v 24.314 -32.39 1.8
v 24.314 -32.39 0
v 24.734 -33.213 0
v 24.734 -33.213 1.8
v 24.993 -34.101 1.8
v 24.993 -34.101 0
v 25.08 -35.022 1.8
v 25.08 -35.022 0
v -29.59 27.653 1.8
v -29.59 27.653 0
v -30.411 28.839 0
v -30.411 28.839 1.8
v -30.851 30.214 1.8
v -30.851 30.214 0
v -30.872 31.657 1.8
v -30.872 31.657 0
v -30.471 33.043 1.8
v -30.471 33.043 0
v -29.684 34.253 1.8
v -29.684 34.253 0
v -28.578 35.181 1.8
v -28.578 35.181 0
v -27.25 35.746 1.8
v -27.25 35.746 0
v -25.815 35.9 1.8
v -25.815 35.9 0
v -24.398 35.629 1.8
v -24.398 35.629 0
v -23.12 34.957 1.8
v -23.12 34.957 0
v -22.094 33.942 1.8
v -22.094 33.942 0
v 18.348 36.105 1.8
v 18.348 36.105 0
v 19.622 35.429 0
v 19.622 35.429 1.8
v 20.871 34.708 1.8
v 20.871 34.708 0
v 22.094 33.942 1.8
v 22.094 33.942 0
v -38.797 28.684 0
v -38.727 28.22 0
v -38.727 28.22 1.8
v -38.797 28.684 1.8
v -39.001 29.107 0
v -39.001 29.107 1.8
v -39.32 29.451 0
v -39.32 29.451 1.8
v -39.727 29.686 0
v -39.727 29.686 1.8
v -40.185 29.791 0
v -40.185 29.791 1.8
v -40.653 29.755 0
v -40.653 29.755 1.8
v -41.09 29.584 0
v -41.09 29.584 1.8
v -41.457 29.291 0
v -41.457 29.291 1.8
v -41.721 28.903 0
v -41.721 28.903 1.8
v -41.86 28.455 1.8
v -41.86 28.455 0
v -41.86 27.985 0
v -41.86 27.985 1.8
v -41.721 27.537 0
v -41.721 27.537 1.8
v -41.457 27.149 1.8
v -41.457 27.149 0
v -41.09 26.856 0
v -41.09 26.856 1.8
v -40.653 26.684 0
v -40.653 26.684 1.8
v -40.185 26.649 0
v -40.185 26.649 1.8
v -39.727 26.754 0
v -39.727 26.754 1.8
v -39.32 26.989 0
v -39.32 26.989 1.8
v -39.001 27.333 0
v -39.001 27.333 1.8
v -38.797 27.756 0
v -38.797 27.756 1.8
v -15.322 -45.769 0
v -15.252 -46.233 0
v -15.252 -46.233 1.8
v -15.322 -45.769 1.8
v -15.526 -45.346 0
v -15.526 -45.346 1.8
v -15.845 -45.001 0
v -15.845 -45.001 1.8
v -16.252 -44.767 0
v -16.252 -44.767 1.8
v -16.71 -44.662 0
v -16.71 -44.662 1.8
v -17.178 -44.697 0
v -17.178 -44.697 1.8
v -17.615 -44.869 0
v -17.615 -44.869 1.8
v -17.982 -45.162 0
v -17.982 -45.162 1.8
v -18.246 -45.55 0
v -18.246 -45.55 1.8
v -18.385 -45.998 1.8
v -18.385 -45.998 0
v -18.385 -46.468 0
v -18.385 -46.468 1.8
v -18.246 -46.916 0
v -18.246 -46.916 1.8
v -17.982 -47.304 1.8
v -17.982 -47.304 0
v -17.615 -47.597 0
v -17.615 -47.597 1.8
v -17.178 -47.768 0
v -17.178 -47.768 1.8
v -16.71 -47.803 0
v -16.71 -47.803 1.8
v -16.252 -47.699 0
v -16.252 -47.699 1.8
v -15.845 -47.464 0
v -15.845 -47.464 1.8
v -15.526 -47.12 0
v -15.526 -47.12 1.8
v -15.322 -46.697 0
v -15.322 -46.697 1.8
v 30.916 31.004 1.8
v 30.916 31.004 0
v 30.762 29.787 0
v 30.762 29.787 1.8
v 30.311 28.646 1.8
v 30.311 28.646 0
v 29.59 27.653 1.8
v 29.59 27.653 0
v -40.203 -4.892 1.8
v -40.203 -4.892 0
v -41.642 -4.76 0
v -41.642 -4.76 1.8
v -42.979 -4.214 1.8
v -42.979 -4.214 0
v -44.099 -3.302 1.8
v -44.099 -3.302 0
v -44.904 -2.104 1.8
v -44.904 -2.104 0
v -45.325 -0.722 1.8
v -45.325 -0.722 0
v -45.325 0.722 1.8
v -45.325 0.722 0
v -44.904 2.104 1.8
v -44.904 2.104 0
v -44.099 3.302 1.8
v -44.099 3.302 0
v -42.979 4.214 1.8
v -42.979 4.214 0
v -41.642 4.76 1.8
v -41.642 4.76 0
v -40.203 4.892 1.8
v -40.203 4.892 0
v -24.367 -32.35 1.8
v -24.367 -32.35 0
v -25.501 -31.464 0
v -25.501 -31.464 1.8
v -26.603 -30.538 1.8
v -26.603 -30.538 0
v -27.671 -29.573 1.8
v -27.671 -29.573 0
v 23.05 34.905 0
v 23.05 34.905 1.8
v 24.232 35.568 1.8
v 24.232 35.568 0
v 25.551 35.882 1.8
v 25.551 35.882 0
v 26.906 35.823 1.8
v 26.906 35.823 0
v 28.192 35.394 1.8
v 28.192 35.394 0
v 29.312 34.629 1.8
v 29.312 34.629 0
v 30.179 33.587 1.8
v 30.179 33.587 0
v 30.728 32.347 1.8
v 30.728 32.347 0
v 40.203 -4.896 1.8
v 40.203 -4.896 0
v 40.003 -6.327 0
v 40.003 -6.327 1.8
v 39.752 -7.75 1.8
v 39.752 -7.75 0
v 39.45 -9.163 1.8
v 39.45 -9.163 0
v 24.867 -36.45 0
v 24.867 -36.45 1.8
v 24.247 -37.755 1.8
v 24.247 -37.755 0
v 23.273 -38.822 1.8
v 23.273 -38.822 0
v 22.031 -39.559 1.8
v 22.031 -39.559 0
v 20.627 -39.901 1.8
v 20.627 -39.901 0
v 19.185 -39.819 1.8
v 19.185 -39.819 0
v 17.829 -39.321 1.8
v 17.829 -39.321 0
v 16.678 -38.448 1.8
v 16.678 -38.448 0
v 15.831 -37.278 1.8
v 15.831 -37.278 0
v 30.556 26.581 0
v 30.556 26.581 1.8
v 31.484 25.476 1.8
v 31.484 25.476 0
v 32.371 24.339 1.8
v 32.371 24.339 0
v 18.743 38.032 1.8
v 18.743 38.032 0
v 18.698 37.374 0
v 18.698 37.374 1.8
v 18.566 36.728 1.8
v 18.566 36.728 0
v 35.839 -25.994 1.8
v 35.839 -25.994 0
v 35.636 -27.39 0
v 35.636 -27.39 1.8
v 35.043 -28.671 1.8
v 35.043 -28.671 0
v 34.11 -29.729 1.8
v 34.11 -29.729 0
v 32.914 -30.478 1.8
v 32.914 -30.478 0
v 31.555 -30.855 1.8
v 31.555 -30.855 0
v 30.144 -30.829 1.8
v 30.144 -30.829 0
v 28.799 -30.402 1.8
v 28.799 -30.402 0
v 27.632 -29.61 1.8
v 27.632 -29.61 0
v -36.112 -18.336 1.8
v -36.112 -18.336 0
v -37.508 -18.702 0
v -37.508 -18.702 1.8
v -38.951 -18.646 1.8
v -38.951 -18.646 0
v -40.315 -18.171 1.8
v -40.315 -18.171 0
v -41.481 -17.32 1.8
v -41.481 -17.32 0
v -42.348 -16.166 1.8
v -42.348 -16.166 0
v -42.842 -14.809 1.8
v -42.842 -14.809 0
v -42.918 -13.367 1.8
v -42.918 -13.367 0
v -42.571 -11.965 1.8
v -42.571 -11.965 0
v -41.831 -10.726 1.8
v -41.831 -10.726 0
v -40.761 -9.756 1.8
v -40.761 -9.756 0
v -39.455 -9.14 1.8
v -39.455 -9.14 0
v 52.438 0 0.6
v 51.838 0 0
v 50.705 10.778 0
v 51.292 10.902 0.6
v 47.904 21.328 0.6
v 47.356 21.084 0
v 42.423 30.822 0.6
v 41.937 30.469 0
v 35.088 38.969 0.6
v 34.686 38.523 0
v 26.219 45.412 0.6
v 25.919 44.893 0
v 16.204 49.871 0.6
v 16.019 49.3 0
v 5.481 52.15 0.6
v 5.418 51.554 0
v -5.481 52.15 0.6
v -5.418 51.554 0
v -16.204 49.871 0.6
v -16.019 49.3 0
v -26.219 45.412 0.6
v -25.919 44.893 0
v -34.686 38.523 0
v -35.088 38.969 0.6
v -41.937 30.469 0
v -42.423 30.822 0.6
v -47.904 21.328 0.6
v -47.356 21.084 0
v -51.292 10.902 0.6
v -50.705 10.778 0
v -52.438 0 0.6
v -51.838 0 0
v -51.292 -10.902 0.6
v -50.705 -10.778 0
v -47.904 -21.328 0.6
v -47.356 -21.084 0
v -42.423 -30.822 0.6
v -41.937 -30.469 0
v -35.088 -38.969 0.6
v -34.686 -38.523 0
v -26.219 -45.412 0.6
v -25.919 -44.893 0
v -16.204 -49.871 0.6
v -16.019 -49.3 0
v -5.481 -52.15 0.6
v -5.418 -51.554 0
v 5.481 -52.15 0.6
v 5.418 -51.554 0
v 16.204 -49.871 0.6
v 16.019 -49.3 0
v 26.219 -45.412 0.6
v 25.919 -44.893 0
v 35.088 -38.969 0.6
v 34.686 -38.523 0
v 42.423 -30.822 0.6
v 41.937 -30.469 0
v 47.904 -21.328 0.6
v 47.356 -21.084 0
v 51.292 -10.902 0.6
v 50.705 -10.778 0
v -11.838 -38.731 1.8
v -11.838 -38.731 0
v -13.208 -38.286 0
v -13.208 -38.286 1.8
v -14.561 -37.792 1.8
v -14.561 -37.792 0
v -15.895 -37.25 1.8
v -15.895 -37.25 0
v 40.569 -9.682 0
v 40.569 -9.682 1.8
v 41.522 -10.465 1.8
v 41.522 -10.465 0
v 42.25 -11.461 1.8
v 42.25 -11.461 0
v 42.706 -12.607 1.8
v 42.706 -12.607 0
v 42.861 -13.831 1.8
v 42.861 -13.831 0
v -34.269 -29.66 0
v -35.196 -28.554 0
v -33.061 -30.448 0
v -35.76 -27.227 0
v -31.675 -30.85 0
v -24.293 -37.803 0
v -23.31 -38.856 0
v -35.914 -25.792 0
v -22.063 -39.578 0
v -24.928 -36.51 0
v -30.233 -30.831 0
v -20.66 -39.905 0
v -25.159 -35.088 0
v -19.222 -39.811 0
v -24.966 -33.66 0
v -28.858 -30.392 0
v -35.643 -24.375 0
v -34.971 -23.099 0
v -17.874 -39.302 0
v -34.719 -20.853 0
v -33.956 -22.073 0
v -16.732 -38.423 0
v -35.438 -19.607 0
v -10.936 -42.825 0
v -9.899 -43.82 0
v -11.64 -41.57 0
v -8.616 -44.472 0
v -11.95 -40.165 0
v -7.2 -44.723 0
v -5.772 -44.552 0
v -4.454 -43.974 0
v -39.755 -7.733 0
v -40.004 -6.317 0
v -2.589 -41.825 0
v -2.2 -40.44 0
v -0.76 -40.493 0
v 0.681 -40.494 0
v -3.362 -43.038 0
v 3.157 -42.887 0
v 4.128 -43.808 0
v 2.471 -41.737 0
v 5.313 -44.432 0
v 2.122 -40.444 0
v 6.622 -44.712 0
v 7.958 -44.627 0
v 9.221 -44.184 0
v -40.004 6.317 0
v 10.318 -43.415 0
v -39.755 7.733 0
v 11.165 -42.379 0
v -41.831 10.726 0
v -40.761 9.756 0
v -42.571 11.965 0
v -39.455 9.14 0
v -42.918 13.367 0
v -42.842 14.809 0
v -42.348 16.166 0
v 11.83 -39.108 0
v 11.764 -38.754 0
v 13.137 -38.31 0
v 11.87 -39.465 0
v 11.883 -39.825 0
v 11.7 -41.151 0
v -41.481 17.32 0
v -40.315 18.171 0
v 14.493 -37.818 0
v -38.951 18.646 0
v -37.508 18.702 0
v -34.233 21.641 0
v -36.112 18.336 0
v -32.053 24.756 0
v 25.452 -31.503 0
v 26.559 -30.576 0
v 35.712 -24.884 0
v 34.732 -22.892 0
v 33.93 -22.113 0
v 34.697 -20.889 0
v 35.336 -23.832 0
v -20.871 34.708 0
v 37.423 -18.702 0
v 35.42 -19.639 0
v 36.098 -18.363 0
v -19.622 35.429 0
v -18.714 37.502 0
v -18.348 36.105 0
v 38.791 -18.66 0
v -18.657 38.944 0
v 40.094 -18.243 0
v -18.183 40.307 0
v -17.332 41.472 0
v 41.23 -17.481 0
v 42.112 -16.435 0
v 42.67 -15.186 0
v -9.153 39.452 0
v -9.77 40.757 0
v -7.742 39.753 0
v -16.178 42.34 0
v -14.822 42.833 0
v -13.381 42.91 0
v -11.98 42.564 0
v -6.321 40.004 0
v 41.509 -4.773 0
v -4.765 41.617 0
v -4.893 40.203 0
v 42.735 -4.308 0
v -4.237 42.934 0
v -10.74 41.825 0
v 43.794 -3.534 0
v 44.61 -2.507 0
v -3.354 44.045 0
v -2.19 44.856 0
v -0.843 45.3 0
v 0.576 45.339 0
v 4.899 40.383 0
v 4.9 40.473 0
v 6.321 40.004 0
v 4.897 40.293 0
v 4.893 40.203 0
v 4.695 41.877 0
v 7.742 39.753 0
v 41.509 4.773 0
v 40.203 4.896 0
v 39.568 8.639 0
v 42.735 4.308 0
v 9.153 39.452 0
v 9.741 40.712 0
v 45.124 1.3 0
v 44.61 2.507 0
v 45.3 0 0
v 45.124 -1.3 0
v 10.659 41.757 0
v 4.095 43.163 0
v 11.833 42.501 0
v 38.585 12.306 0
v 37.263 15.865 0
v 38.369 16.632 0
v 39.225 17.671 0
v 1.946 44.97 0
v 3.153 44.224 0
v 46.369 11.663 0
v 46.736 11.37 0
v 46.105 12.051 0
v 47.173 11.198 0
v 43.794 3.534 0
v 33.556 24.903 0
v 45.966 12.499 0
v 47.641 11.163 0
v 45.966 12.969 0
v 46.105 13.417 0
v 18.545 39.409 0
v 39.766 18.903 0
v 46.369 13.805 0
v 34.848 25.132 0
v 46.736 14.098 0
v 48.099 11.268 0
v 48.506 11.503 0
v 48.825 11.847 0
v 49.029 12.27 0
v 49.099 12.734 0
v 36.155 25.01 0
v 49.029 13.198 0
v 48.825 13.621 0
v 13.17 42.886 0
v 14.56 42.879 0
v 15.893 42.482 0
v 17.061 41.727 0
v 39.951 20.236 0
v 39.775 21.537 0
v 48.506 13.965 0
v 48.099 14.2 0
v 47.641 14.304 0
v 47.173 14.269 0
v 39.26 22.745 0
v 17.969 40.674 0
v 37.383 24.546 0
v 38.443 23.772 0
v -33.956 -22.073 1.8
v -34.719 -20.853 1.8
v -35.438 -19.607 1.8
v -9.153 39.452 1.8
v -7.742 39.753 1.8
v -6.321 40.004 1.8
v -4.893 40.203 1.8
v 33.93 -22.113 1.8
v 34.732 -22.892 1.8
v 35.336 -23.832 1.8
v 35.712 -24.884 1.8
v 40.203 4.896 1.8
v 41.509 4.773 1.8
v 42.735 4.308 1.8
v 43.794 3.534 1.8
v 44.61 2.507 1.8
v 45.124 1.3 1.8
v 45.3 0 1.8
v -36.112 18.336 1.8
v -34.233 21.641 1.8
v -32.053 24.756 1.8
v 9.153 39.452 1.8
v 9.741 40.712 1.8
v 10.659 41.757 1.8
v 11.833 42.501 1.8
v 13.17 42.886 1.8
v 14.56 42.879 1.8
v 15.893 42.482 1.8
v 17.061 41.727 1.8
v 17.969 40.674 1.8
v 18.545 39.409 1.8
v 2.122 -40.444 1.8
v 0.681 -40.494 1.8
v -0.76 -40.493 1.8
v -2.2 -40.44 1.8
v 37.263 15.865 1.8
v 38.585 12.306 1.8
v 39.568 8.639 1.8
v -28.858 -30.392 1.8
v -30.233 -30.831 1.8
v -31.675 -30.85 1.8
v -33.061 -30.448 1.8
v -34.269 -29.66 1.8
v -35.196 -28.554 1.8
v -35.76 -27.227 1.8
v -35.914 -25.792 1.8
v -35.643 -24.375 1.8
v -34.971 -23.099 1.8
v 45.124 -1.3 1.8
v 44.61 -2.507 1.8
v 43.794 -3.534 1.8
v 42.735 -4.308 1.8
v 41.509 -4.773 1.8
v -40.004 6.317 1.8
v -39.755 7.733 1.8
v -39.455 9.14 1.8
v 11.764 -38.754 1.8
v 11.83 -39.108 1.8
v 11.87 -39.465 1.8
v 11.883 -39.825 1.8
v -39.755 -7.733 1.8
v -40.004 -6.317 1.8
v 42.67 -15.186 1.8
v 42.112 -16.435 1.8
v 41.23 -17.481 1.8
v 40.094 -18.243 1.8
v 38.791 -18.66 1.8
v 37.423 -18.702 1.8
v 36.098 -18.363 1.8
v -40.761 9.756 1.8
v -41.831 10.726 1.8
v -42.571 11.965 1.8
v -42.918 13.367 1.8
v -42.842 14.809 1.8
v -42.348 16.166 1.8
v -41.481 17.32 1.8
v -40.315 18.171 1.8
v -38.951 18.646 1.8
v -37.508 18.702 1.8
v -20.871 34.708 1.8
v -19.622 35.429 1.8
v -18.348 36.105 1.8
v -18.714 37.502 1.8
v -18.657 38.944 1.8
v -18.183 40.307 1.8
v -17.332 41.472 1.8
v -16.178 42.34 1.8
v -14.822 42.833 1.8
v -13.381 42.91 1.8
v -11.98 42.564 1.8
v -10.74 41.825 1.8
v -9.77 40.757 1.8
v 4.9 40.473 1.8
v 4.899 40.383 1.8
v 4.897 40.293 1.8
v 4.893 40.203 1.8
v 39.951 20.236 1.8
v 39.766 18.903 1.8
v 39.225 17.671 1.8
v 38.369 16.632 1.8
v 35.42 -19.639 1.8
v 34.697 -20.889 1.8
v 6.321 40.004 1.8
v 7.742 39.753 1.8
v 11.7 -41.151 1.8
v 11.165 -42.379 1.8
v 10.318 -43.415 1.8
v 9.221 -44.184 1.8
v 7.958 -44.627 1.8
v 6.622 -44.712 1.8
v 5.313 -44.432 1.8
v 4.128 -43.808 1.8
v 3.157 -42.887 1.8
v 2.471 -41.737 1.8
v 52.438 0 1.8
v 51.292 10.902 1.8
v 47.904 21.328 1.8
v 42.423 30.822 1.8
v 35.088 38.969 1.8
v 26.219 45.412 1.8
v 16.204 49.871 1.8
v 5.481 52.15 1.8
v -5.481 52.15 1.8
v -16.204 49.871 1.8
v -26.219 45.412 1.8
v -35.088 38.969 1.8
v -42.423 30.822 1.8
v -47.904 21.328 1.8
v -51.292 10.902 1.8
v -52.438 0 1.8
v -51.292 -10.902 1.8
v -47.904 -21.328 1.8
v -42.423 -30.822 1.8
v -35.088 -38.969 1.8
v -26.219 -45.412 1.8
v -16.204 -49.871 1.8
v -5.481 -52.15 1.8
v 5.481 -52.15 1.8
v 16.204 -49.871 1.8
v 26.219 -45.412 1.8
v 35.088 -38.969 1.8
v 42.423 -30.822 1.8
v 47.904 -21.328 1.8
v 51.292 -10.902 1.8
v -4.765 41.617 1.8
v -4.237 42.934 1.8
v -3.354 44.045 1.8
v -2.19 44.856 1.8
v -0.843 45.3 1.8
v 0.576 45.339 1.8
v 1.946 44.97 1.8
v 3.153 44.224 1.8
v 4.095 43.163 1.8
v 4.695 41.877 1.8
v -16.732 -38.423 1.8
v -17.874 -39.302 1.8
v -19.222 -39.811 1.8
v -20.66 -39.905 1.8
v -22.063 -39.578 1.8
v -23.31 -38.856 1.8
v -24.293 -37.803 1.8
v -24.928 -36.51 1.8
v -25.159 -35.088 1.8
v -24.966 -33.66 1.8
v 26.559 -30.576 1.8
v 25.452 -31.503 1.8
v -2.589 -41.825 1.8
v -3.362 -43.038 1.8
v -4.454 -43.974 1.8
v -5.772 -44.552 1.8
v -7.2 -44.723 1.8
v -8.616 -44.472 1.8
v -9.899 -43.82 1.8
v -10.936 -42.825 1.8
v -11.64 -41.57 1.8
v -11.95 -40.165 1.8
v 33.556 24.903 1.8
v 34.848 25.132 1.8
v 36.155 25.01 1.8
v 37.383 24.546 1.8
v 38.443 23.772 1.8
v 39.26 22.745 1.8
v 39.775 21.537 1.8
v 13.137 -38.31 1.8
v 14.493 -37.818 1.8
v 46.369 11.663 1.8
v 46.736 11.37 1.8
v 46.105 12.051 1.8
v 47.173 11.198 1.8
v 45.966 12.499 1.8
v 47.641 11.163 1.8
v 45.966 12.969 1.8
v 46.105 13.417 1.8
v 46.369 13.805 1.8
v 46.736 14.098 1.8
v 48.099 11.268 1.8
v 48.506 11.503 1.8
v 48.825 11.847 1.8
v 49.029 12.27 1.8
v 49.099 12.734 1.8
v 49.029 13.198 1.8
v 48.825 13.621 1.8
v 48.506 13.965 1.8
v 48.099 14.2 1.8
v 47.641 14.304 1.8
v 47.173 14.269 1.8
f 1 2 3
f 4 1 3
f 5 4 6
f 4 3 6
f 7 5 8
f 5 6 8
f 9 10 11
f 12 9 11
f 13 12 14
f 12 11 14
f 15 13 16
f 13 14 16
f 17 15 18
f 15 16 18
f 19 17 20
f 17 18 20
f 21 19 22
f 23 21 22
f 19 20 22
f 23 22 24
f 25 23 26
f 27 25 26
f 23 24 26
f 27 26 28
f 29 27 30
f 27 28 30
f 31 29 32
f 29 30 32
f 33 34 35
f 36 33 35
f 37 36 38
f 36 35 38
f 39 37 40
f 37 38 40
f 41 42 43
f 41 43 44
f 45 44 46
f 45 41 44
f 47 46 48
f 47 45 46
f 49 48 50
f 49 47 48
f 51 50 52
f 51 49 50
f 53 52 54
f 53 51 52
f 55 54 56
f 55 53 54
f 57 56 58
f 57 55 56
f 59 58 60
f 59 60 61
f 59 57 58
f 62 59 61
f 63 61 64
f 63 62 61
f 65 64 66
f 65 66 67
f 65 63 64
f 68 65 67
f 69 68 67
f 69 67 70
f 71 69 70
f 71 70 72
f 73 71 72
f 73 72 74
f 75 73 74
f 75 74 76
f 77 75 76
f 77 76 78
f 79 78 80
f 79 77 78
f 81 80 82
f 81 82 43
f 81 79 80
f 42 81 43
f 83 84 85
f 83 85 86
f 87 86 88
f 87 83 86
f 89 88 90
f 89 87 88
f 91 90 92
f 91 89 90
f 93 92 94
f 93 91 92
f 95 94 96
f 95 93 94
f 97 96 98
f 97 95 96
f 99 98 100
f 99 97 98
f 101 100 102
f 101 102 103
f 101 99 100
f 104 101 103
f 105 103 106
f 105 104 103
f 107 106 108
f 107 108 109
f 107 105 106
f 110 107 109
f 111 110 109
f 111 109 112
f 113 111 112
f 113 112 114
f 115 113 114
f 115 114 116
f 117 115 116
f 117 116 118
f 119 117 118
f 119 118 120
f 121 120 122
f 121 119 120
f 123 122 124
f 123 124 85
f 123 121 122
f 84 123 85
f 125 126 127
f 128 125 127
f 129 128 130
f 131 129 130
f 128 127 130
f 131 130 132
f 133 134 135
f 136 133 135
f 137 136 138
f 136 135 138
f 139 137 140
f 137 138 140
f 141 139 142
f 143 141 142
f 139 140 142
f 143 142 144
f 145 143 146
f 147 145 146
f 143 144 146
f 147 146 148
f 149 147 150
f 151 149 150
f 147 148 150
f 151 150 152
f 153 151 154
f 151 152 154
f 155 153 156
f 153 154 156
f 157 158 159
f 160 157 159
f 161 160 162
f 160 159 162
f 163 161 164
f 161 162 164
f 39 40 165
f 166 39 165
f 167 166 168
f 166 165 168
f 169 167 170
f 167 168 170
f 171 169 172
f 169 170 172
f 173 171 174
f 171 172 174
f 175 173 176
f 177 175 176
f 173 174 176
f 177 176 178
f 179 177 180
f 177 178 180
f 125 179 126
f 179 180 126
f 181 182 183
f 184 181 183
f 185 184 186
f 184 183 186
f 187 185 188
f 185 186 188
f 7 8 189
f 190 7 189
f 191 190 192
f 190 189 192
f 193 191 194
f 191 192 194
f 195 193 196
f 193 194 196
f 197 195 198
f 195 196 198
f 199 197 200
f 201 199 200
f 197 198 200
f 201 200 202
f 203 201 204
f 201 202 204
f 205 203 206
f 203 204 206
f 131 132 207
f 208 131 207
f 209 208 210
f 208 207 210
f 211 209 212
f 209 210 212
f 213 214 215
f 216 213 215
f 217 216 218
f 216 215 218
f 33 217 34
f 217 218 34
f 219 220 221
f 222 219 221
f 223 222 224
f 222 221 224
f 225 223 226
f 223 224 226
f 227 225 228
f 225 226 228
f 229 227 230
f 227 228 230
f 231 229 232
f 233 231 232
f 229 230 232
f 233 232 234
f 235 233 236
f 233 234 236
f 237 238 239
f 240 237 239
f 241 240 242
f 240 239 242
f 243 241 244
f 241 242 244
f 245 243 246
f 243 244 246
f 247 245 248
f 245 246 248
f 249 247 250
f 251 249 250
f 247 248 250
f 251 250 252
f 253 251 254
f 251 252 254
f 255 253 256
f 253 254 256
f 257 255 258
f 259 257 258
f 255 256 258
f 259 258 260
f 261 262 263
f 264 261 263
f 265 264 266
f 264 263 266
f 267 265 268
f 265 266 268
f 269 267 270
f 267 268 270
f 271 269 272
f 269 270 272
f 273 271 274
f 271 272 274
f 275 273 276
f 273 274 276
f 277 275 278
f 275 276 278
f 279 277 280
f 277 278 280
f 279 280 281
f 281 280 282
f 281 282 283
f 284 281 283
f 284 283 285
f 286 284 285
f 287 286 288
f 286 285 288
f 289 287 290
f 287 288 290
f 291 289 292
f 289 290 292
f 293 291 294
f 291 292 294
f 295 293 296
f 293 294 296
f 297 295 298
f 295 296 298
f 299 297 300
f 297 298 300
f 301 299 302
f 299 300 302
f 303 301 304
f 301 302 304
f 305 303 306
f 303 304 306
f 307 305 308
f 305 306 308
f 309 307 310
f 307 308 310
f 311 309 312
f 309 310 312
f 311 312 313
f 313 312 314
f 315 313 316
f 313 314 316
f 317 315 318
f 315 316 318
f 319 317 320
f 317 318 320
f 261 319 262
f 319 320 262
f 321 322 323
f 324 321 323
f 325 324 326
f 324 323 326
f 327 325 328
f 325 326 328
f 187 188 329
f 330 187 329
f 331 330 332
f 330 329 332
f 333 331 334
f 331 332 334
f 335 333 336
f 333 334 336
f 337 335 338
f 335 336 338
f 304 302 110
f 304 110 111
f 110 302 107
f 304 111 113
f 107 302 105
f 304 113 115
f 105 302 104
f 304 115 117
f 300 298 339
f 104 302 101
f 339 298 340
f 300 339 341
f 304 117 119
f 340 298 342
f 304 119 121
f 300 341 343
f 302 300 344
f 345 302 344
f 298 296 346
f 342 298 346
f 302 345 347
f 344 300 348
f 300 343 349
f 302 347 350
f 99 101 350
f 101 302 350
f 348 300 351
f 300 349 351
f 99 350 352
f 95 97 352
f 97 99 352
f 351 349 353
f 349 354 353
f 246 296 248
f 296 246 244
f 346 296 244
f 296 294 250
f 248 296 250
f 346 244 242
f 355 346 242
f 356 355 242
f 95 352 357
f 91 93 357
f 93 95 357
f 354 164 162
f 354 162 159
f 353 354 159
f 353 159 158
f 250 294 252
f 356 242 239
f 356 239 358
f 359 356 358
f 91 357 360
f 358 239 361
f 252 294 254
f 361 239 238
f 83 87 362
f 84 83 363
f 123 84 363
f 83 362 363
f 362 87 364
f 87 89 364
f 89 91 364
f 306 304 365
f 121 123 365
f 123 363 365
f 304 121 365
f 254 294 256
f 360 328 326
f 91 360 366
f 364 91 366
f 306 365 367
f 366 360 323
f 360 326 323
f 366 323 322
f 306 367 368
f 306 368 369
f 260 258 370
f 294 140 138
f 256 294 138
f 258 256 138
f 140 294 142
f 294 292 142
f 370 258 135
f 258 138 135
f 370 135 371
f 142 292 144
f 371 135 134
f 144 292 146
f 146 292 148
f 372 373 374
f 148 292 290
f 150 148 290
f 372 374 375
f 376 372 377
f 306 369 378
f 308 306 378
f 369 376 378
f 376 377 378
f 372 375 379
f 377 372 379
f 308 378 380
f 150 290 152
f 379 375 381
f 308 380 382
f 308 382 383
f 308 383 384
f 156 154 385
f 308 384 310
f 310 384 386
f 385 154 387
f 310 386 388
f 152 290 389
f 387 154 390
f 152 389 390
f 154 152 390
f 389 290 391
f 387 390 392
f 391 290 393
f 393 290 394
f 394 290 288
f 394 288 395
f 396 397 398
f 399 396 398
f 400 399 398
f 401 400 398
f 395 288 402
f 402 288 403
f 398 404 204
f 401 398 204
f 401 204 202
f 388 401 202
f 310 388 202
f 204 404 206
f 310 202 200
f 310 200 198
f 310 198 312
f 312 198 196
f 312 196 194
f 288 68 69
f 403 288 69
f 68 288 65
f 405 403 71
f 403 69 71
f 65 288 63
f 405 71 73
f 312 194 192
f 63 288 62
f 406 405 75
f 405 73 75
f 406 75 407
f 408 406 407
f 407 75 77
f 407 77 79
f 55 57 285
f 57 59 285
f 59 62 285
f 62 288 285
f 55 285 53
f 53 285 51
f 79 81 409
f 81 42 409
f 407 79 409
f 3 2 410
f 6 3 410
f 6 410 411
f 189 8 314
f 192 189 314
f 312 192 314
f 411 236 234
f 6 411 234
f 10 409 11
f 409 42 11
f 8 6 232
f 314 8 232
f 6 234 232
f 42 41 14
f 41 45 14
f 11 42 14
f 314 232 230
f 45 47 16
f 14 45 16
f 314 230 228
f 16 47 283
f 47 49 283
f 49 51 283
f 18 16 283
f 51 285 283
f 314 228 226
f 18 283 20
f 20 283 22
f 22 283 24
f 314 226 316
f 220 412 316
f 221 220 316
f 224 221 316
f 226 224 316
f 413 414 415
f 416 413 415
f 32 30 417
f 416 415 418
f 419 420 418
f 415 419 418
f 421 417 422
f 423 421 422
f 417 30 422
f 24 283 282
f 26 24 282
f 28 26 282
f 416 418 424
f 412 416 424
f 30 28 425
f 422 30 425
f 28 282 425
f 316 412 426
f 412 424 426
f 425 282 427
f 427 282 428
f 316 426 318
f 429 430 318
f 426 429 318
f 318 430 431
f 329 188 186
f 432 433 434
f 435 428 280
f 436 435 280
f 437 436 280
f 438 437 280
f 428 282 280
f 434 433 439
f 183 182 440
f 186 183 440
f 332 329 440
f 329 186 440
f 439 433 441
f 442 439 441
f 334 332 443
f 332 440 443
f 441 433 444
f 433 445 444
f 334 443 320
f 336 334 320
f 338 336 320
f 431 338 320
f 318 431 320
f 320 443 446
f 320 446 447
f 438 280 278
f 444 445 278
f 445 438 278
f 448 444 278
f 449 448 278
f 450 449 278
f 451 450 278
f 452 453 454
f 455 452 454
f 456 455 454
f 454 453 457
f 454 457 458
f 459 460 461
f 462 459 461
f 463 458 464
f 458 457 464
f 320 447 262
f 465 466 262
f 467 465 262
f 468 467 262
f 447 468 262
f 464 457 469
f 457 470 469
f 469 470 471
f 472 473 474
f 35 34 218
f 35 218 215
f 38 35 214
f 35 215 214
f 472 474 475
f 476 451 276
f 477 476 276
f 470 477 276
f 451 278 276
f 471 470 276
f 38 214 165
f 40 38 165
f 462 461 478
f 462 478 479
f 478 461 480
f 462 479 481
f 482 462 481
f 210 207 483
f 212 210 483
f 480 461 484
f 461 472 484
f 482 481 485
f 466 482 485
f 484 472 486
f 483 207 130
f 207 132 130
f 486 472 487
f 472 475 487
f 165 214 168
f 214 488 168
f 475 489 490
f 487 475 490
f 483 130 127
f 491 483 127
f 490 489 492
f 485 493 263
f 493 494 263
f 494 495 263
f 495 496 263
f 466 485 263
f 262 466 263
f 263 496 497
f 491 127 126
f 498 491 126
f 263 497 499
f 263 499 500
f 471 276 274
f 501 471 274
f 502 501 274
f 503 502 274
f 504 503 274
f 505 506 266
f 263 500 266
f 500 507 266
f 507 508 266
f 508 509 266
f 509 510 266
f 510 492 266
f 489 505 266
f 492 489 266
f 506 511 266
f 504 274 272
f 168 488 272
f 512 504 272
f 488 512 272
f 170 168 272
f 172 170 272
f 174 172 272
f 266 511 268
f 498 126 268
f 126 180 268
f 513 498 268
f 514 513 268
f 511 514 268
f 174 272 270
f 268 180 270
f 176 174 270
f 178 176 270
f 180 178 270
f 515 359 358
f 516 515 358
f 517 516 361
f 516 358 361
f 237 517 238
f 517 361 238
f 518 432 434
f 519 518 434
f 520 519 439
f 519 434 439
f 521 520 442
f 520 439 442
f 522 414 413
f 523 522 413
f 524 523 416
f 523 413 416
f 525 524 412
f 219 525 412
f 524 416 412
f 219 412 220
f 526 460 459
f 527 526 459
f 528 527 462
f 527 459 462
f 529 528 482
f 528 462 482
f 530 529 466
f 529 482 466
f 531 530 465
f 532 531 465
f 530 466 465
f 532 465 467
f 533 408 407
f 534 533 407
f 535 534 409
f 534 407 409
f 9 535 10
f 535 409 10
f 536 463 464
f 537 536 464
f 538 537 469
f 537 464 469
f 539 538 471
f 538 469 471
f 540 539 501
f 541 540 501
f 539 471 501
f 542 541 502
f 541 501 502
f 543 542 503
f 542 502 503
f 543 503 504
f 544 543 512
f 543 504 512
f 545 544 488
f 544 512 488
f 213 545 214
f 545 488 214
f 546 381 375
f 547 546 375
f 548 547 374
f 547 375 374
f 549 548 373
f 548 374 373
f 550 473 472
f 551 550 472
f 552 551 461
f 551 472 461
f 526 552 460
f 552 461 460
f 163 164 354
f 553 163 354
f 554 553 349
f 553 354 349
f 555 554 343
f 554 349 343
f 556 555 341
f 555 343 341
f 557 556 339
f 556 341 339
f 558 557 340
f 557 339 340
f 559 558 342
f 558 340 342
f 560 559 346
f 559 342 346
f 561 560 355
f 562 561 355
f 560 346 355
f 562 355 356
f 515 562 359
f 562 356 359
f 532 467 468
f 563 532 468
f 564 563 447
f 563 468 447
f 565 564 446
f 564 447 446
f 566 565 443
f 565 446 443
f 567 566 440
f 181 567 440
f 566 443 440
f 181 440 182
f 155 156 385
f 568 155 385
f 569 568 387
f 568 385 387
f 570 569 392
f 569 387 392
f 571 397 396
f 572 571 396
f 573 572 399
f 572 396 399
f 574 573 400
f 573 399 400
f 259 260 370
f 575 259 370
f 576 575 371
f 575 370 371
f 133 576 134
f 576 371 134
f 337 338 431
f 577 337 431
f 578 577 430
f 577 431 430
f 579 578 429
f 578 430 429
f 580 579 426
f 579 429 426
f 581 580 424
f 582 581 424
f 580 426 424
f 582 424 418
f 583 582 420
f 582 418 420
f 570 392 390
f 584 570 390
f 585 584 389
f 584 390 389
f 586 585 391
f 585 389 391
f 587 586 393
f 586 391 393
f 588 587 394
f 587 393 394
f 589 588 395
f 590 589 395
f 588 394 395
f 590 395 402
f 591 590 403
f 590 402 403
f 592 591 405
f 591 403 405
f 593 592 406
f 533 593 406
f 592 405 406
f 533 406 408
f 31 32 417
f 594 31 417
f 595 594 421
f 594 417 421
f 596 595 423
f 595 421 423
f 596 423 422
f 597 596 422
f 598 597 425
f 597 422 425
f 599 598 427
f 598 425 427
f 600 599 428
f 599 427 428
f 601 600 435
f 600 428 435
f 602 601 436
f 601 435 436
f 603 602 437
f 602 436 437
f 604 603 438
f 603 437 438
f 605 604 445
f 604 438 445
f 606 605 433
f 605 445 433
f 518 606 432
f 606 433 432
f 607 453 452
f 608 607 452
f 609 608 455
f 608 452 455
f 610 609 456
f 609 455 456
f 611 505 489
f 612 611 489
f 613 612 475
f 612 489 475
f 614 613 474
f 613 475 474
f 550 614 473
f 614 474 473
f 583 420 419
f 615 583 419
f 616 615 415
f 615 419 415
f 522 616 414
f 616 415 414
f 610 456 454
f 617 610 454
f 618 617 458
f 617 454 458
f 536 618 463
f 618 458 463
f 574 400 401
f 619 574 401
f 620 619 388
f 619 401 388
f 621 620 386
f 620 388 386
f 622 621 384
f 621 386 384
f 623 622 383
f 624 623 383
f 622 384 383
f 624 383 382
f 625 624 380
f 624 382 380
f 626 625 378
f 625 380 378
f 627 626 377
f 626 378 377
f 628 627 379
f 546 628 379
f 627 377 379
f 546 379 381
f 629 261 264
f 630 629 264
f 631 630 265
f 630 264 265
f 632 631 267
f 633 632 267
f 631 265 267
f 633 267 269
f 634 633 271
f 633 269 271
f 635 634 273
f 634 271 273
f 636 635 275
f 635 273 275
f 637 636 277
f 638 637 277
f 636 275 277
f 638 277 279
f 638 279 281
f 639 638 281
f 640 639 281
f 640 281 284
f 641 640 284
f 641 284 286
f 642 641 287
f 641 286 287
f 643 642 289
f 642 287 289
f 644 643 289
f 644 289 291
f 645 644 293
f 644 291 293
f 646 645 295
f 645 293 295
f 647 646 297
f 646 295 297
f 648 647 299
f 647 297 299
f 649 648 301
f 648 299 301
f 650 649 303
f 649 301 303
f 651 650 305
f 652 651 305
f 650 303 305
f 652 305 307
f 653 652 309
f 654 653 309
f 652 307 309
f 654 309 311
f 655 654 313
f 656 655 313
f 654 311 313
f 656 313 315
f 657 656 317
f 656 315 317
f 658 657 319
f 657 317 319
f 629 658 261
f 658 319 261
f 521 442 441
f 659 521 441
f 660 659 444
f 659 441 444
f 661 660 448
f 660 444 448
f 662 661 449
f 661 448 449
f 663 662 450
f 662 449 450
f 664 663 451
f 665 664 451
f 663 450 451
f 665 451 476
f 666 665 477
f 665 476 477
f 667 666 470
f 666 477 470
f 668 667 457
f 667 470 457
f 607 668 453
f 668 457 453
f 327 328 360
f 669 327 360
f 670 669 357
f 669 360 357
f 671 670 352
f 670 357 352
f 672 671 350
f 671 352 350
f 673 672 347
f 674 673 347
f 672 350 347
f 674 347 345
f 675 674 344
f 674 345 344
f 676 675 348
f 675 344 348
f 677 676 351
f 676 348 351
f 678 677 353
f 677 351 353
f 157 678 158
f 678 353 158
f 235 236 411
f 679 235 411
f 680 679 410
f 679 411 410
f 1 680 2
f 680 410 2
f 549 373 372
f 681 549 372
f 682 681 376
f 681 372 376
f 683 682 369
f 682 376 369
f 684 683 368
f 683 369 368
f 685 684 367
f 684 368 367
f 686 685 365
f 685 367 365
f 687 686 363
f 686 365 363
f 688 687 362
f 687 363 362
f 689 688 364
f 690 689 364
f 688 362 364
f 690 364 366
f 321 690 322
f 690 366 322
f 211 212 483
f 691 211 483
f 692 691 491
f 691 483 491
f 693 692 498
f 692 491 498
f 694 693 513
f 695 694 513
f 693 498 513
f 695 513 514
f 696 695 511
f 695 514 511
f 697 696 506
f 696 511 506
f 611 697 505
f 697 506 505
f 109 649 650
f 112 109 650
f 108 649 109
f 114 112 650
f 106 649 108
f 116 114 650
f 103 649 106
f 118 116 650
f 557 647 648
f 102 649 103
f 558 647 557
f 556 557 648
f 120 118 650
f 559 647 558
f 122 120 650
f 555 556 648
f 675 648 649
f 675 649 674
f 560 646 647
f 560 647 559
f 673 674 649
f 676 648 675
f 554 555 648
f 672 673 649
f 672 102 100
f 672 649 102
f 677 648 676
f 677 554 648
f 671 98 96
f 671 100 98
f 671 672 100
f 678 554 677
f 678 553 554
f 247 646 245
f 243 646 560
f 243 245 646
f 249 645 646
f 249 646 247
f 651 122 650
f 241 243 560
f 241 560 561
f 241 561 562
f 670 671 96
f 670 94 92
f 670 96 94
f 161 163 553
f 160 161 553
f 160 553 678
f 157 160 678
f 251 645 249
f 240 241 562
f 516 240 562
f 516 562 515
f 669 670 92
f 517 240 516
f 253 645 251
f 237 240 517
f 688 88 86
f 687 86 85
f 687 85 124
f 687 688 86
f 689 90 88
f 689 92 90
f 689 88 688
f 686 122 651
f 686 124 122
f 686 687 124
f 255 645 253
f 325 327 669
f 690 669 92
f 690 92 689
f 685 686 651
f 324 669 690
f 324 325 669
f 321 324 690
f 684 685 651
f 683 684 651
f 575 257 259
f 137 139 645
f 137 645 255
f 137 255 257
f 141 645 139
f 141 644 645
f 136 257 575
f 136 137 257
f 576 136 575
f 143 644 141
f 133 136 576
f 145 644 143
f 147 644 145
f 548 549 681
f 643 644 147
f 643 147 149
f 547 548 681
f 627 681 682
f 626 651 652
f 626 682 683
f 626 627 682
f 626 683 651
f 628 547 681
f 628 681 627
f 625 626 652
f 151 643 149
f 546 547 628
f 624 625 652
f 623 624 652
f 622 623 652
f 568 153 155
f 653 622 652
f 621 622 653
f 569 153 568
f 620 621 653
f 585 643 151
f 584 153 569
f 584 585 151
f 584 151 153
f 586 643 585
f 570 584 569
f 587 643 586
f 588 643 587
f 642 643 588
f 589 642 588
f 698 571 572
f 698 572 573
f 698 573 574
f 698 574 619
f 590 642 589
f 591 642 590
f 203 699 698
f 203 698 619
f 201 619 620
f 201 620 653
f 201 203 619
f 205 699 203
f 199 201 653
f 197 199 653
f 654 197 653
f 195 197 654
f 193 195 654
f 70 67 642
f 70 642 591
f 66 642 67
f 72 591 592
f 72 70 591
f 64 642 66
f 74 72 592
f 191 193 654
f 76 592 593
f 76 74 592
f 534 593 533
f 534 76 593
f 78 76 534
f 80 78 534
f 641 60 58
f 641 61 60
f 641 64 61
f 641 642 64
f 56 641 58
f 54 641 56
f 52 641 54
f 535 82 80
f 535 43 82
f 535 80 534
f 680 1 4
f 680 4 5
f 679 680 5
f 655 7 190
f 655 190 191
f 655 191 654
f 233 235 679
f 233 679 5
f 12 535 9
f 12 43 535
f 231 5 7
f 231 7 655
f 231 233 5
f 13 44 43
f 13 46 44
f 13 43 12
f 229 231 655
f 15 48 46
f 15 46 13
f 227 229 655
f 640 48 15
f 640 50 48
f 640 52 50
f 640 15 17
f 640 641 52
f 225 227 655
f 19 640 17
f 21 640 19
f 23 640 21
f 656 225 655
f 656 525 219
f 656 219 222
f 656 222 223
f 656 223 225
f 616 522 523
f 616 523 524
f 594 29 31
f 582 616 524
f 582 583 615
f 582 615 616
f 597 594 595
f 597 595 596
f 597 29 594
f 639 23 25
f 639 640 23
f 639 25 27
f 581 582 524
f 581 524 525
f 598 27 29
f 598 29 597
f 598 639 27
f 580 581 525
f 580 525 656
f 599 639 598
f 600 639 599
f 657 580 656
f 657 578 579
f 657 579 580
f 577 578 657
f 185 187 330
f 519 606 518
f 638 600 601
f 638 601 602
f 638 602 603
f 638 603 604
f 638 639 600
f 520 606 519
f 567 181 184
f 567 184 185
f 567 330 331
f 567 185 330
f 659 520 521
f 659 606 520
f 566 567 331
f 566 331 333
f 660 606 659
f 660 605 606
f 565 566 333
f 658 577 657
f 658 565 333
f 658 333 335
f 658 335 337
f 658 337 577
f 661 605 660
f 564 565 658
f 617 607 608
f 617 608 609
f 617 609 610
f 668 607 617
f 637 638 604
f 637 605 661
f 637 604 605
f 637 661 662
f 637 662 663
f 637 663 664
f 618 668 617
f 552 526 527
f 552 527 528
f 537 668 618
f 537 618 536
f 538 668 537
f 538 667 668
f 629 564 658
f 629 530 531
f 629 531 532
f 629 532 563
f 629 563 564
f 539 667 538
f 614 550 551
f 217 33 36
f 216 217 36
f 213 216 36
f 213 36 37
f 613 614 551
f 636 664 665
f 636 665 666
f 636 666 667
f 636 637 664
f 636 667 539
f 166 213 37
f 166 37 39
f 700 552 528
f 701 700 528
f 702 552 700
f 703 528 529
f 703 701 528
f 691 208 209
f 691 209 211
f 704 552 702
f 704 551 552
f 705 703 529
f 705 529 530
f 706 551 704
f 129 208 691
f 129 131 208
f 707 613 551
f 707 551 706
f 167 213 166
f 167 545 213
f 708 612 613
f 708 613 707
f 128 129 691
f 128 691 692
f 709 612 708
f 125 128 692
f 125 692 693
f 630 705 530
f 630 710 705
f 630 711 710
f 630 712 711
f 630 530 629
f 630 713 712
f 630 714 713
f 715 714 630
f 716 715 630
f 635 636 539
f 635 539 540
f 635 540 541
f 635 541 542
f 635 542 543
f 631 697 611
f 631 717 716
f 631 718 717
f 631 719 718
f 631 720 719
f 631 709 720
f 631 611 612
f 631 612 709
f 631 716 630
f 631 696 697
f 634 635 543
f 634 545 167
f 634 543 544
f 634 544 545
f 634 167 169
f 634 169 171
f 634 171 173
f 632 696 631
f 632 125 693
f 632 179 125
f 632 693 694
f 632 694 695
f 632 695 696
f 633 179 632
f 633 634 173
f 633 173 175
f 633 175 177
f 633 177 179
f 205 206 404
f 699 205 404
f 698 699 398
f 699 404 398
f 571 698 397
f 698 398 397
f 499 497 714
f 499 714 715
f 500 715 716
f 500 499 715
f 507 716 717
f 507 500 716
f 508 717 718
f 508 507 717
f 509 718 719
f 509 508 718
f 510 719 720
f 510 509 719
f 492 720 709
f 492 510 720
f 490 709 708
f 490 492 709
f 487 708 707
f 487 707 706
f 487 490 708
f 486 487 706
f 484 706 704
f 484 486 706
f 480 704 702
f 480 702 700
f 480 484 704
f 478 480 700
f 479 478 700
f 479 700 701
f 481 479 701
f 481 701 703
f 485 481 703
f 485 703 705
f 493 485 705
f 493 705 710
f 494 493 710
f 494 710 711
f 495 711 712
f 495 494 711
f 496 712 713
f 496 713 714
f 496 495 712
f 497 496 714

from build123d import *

# Parameters (mm, degrees)
F0_R     = 17.4791666667
F0_R_2   = 0.525
F1_DEPTH = 0.6
F2_SIZE  = 0.2
F3_SCALE = 3


with BuildPart() as f1:
    # F0 (on Top) → F1 (new body)
    with BuildSketch(Plane.XY):
        Circle(F0_R)
        with Locations((-5.6091303505, -15.4109589809)):
            Circle(F0_R_2, mode=Mode.SUBTRACT)
        with BuildLine():
            ThreePointArc((12.4211490883, 5.28819963), (13.0398483265, 3.494618094), (13.400990099, 1.6320123671))
            ThreePointArc((13.400990099, 1.6320123671), (14.5981493335, 1.1779324057), (15.1, 0))
            ThreePointArc((15.1, 0), (14.5981493335, -1.1779324057), (13.400990099, -1.6320123671))
            ThreePointArc((13.400990099, -1.6320123671), (13.2945098091, -2.3464886393), (13.1499649563, -3.0542464943))
            ThreePointArc((13.1499649563, -3.0542464943), (13.9724997299, -3.6467176264), (14.2870667184, -4.6103737402))
            ThreePointArc((14.2870667184, -4.6103737402), (13.5629249977, -5.9672629728), (12.0325993029, -6.1209928947))
            ThreePointArc((12.0325993029, -6.1209928947), (11.6880692654, -6.7556670173), (11.3100935731, -7.3710096574))
            ThreePointArc((11.3100935731, -7.3710096574), (11.7786571464, -7.9438467562), (11.9463186252, -8.6646683655))
            ThreePointArc((11.9463186252, -8.6646683655), (10.9714810033, -10.1593794332), (9.210611063, -9.8698857058))
            ThreePointArc((9.210611063, -9.8698857058), (8.6699484839, -10.3480429689), (8.1045033915, -10.7966209889))
            ThreePointArc((8.1045033915, -10.7966209889), (8.2948880144, -11.2170122777), (8.3600844859, -11.6738761091))
            ThreePointArc((8.3600844859, -11.6738761091), (7.1138213291, -13.2606824792), (5.2768749477, -12.4259643806))
            ThreePointArc((5.2768749477, -12.4259643806), (4.6057092155, -12.6900529007), (3.9213971545, -12.9179195057))
            ThreePointArc((3.9213971545, -12.9179195057), (3.9510070235, -13.0953907943), (3.9609170652, -13.2750421058))
            ThreePointArc((3.9609170652, -13.2750421058), (2.4309982831, -14.9050983037), (0.7073457896, -13.4814562245))
            ThreePointArc((0.7073457896, -13.4814562245), (-0.0130943041, -13.4999936496), (-0.7334970815, -13.4800586806))
            ThreePointArc((-0.7334970815, -13.4800586806), (-2.6390844274, -14.8832879588), (-3.9460263226, -12.9104173543))
            ThreePointArc((-3.9460263226, -12.9104173543), (-4.6288343322, -12.6816360429), (-5.2984716212, -12.4167708555))
            ThreePointArc((-5.2984716212, -12.4167708555), (-7.5709419973, -13.0876933984), (-8.1222459609, -10.783279675))
            ThreePointArc((-8.1222459609, -10.783279675), (-8.6853165754, -10.3351476034), (-9.2237075057, -9.8576477848))
            ThreePointArc((-9.2237075057, -9.8576477848), (-11.5911782598, -9.713769738), (-11.3188073747, -7.3576218723))
            ThreePointArc((-11.3188073747, -7.3576218723), (-11.6946164061, -6.744327032), (-12.0372272938, -6.1118867037))
            ThreePointArc((-12.0372272938, -6.1118867037), (-14.2150797243, -5.168494422), (-13.1517324298, -3.0466266746))
            ThreePointArc((-13.1517324298, -3.0466266746), (-13.2952994905, -2.3420101316), (-13.4011439404, -1.6307486284))
            ThreePointArc((-13.4011439404, -1.6307486284), (-15.1263287229, 0), (-13.4011439404, 1.6307486284))
            ThreePointArc((-13.4011439404, 1.6307486284), (-13.2952994905, 2.3420101316), (-13.1517324298, 3.0466266746))
            ThreePointArc((-13.1517324298, 3.0466266746), (-14.2150797243, 5.168494422), (-12.0372272938, 6.1118867037))
            ThreePointArc((-12.0372272938, 6.1118867037), (-11.0598636595, 7.7414091633), (-9.8633913446, 9.217565361))
            ThreePointArc((-9.8633913446, 9.217565361), (-9.7217308873, 11.5859077112), (-7.3647698988, 11.3141576946))
            ThreePointArc((-7.3647698988, 11.3141576946), (-6.75, 11.6913429511), (-6.1159630365, 12.0351566727))
            ThreePointArc((-6.1159630365, 12.0351566727), (-5.1728249601, 14.2122197728), (-3.0509500914, 13.1507301523))
            ThreePointArc((-3.0509500914, 13.1507301523), (-2.3442503985, 13.2949046657), (-1.6308593243, 13.4011304696))
            ThreePointArc((-1.6308593243, 13.4011304696), (-0.0449493128, 15.1237097603), (1.6333333333, 13.4909950464))
            ThreePointArc((1.6333333333, 13.4909950464), (1.6327147139, 13.4460457336), (1.6308593243, 13.4011304696))
            ThreePointArc((1.6308593243, 13.4011304696), (2.3442503985, 13.2949046657), (3.0509500914, 13.1507301523))
            ThreePointArc((3.0509500914, 13.1507301523), (4.8534435624, 14.2931039672), (6.2475253927, 12.6773884922))
            ThreePointArc((6.2475253927, 12.6773884922), (6.2142968019, 12.3496041257), (6.1159630365, 12.0351566727))
            ThreePointArc((6.1159630365, 12.0351566727), (6.75, 11.6913429511), (7.3647698988, 11.3141576946))
            ThreePointArc((7.3647698988, 11.3141576946), (9.1880272411, 11.8843253264), (10.3051777915, 10.3347017875))
            ThreePointArc((10.3051777915, 10.3347017875), (10.1907208563, 9.7340419295), (9.8633913446, 9.217565361))
            ThreePointArc((9.8633913446, 9.217565361), (10.3415999821, 8.6776327308), (10.790289764, 8.1129308397))
            ThreePointArc((10.790289764, 8.1129308397), (12.4609745427, 8.181944599), (13.3168777659, 6.7454975232))
            ThreePointArc((13.3168777659, 6.7454975232), (13.0750421955, 5.8902129195), (12.4211490883, 5.28819963))
        make_face(mode=Mode.SUBTRACT)
        with Locations((-13.4340935263, 9.4066535562)):
            Circle(F0_R_2, mode=Mode.SUBTRACT)
        with Locations((15.8411835511, 4.2446323397)):
            Circle(F0_R_2, mode=Mode.SUBTRACT)
    extrude(amount=F1_DEPTH)

    # F2
    f2_edges = [f1.edges().sort_by_distance(p)[0] for p in [
        (-17.479167, 0, 0),
    ]]
    chamfer(f2_edges, length=F2_SIZE)


with BuildPart() as f1_1:
    # F3: moved
    add(f1.part.scale(F3_SCALE))


solid = f1_1.part
